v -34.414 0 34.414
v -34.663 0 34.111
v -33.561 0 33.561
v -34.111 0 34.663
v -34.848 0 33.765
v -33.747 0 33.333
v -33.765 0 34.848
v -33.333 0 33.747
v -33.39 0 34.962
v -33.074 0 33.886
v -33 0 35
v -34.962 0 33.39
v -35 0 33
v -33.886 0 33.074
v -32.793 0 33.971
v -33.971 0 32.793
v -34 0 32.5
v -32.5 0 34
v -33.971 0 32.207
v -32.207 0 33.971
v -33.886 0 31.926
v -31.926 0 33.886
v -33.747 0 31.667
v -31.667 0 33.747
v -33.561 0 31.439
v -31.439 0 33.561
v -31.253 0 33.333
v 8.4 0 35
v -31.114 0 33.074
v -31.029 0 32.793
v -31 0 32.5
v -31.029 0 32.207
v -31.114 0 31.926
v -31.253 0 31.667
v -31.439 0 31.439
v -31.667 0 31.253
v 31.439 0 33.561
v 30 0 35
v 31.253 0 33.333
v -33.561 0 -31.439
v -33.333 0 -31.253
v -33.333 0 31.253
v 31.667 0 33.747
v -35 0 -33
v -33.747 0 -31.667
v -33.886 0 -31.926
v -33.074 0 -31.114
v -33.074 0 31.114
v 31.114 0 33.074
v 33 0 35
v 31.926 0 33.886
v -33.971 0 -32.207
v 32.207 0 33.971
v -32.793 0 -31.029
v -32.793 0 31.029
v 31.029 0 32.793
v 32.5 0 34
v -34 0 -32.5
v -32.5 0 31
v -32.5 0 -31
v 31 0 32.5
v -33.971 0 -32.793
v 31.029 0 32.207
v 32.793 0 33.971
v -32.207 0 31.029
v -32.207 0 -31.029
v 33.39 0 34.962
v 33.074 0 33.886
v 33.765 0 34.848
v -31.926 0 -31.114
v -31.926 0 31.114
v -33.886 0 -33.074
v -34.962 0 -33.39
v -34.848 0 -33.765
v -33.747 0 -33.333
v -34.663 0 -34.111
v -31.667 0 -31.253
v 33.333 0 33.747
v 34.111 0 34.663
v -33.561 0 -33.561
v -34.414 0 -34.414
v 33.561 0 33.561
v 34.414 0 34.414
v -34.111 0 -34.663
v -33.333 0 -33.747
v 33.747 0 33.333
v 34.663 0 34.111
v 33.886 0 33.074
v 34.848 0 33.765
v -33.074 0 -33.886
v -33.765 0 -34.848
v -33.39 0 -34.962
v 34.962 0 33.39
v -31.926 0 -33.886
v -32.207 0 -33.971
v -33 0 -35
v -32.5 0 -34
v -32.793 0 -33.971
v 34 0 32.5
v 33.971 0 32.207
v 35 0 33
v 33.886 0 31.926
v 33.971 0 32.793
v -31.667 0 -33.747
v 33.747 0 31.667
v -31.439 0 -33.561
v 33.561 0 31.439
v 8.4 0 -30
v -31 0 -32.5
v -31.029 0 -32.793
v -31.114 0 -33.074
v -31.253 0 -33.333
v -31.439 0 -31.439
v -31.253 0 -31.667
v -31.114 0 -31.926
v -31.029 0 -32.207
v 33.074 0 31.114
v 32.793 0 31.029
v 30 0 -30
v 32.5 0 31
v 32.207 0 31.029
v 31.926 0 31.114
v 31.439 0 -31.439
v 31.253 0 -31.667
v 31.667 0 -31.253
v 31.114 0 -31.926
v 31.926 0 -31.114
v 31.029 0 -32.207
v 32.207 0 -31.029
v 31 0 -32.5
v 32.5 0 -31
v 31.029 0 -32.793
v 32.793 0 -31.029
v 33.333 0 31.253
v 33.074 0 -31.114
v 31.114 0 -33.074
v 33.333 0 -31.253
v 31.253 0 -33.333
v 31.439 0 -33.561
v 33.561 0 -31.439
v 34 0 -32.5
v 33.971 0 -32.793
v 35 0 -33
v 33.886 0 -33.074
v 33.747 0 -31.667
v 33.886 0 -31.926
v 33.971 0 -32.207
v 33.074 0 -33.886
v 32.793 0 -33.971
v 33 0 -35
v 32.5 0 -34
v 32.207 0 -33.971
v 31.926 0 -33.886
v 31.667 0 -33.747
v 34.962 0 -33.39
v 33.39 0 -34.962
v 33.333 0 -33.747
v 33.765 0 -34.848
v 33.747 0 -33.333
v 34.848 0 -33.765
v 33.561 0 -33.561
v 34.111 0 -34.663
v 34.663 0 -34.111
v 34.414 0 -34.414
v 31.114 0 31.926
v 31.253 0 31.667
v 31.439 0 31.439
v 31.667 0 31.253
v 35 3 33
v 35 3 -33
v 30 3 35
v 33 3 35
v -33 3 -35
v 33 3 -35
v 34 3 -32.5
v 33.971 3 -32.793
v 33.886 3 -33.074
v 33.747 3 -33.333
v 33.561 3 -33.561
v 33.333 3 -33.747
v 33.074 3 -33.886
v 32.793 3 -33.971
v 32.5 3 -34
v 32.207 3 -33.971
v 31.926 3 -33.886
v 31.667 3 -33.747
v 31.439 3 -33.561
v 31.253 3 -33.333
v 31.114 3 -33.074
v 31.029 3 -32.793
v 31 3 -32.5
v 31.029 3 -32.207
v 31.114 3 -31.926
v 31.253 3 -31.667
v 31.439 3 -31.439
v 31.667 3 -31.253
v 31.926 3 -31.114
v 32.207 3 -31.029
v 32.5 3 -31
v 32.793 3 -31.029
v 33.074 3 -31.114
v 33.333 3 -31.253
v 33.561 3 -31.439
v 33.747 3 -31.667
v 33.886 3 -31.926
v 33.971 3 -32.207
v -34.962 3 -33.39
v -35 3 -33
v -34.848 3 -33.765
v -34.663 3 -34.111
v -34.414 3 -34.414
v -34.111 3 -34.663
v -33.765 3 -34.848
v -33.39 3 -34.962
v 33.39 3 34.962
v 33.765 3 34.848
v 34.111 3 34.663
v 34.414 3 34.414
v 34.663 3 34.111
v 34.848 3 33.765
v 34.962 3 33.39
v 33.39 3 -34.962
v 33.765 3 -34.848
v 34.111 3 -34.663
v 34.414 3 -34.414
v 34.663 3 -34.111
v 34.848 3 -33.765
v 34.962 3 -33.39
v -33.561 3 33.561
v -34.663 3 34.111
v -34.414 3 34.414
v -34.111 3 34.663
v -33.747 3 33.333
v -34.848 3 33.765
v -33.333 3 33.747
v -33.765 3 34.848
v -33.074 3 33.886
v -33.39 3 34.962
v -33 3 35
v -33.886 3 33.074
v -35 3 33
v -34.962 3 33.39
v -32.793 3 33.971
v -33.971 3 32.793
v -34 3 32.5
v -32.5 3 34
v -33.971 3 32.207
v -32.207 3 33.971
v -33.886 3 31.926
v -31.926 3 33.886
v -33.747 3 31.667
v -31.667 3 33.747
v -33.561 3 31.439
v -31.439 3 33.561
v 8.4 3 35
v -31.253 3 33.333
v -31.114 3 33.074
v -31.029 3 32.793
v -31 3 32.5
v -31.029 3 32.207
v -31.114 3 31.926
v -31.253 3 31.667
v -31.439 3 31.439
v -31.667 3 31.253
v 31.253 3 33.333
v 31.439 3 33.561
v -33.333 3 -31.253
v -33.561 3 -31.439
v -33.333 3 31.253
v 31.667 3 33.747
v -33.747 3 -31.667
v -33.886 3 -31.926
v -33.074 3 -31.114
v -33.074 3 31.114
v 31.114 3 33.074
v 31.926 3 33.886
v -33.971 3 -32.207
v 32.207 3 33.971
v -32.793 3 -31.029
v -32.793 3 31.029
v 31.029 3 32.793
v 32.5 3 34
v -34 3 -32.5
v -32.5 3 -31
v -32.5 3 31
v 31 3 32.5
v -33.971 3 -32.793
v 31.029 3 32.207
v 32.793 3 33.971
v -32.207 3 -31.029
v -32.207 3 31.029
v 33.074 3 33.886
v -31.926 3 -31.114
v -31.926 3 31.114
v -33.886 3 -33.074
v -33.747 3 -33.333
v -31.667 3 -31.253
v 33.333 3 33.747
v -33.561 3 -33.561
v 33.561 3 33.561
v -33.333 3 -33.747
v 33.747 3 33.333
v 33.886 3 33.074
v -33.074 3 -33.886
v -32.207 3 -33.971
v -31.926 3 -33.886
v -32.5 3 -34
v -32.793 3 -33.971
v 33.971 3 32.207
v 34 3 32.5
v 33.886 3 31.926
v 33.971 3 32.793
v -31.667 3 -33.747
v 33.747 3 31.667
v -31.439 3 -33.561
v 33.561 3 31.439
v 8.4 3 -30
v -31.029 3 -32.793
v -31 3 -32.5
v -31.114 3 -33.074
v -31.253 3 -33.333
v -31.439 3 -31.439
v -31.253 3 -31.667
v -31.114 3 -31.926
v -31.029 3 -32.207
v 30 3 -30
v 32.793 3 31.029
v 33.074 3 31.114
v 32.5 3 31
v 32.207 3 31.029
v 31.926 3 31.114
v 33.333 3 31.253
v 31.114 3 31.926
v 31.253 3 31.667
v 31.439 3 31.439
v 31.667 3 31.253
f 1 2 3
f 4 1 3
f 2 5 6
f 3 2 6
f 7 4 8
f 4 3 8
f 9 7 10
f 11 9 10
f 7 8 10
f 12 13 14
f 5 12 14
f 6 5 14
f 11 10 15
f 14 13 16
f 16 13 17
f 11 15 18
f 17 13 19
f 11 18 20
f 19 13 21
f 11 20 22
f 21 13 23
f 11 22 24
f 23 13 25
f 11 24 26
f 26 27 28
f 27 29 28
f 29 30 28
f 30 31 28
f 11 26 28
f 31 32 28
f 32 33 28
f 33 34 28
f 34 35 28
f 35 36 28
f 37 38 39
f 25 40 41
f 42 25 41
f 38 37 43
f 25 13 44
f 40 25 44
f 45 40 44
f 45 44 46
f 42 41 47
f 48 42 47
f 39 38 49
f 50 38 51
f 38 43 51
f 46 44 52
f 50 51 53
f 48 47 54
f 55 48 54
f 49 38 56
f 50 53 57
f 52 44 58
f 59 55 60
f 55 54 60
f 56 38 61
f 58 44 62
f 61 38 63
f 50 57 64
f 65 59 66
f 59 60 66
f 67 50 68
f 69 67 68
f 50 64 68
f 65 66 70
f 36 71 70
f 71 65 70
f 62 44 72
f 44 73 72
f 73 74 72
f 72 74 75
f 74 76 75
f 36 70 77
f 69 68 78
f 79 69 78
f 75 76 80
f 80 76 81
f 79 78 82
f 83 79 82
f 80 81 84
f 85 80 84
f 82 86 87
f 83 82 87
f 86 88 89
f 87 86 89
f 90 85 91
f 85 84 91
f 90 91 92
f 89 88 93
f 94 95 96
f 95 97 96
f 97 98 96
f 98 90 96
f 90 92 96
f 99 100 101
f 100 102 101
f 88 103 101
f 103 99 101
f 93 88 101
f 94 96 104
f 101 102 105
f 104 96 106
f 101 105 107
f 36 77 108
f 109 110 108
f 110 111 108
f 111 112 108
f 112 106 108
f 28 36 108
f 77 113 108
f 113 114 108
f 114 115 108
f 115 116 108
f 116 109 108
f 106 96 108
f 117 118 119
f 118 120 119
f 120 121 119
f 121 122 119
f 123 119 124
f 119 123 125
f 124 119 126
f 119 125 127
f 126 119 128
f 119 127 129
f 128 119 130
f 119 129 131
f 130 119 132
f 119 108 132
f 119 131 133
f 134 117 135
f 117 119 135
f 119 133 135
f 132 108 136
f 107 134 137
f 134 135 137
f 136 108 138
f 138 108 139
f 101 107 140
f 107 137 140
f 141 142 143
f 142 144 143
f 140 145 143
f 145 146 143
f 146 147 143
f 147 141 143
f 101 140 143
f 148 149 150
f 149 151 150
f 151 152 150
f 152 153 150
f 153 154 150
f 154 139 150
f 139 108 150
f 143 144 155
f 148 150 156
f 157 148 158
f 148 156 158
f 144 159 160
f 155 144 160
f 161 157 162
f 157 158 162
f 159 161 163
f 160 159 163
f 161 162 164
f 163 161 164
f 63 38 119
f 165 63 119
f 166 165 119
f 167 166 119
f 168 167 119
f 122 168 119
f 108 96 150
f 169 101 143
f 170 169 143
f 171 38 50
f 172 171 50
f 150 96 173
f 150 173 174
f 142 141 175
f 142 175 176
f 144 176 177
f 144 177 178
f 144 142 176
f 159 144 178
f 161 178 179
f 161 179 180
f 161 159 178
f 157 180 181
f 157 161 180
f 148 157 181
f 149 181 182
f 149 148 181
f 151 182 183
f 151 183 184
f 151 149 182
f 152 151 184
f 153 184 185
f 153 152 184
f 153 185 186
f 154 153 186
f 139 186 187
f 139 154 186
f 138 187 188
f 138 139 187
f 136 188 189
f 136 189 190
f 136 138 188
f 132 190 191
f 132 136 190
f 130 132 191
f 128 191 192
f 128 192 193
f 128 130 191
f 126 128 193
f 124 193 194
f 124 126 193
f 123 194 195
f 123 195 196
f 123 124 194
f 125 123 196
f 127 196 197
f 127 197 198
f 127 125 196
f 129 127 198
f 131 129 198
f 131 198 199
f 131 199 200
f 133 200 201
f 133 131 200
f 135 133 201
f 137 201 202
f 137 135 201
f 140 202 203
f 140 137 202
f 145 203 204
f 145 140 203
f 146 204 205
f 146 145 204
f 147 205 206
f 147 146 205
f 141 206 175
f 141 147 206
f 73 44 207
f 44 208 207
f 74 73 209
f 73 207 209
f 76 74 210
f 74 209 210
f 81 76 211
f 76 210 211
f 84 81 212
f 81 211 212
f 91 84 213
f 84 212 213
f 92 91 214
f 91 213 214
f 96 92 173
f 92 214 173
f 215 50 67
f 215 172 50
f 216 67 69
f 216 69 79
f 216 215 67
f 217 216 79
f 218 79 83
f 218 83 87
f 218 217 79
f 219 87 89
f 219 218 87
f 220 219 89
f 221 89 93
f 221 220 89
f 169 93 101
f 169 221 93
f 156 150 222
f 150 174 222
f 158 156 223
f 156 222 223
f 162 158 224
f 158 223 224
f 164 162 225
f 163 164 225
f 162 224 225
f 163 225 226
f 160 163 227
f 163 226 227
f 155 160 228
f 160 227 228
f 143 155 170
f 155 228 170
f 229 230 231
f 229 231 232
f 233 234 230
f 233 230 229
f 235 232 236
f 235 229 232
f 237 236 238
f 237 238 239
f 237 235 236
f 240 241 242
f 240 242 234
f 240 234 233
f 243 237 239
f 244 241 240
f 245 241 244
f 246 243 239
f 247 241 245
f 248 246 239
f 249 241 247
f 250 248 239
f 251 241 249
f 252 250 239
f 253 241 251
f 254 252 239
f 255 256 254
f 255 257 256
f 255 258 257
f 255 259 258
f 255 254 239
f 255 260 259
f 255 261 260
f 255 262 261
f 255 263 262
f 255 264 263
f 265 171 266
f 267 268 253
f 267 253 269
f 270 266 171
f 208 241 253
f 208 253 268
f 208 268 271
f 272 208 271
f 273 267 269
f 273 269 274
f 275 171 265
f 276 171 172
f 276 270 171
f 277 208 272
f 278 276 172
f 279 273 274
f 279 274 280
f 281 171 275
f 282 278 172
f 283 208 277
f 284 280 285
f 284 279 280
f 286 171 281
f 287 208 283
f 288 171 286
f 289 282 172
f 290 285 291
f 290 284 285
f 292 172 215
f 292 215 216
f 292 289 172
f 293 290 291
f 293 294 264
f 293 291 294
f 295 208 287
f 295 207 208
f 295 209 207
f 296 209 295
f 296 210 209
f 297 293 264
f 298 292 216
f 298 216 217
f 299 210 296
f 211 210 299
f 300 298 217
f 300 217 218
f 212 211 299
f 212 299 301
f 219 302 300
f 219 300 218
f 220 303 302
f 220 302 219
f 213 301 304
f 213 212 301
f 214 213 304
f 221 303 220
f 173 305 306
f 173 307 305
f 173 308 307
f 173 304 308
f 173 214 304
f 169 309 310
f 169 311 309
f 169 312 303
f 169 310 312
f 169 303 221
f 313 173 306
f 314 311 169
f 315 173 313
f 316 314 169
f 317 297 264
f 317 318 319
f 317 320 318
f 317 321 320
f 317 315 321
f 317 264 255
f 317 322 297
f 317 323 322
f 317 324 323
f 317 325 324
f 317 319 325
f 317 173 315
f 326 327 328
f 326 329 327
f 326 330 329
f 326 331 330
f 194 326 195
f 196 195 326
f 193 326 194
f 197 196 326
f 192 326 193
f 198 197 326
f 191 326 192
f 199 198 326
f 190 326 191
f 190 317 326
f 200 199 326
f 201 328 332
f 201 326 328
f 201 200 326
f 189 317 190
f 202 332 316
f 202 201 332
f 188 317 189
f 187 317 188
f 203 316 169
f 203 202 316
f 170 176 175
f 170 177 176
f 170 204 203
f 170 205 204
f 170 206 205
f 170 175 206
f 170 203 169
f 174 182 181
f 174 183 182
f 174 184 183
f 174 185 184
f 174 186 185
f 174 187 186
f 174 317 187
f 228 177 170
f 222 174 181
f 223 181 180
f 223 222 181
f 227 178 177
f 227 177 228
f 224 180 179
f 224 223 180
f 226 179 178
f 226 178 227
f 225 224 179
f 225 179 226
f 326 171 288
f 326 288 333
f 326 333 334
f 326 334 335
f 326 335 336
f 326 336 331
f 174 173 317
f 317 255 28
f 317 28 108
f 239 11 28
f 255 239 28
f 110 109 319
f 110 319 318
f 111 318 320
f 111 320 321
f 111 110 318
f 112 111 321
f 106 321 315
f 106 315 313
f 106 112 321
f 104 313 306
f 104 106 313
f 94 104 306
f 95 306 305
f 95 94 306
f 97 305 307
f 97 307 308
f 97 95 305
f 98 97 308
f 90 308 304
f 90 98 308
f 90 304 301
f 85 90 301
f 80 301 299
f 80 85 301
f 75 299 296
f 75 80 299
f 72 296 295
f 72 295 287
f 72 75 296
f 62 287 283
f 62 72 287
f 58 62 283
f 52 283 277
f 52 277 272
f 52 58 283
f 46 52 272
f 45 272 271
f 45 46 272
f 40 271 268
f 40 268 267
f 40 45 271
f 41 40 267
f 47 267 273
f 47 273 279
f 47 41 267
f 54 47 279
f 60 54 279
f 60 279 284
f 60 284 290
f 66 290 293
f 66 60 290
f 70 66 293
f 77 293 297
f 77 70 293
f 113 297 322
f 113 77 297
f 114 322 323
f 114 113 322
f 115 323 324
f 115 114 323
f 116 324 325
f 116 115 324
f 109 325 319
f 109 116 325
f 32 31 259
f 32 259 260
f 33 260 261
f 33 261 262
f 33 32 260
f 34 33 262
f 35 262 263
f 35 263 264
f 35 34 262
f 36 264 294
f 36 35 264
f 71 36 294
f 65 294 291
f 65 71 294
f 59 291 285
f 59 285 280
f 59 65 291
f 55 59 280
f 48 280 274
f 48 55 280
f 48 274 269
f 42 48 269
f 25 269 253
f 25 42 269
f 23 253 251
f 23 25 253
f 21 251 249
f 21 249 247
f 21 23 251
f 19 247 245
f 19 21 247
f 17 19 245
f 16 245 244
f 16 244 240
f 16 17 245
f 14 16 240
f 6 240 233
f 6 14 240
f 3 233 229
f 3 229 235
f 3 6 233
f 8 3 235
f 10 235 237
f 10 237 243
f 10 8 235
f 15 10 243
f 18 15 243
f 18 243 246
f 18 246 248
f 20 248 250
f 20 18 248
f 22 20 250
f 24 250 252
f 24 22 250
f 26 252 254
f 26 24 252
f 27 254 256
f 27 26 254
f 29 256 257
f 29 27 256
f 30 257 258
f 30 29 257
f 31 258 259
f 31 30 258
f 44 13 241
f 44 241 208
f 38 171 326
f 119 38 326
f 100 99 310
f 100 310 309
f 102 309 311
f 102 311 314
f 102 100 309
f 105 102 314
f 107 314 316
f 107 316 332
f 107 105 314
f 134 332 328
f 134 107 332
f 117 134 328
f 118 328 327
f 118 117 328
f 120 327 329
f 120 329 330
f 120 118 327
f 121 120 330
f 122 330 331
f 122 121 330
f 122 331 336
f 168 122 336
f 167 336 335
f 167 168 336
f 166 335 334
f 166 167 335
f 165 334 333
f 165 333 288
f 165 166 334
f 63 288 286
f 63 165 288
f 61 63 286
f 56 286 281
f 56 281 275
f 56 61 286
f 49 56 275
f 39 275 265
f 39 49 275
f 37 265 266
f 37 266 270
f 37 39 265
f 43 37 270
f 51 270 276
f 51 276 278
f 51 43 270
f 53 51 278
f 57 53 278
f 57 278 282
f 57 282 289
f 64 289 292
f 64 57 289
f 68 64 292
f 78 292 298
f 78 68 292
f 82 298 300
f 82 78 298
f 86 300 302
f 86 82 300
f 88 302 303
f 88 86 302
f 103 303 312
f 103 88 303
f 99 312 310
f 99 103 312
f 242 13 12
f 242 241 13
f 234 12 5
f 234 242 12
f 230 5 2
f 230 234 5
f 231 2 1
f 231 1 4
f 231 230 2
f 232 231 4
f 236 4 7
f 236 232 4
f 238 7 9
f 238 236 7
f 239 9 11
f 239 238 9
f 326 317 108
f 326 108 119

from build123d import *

# Parameters (mm, degrees)
SKETCH1_W           = 70
SKETCH1_H           = 70
SKETCH1_R           = 1.5
BOSS_EXTRUDE1_DEPTH = 3
FILLET1_R           = 2
SKETCH2_W           = 21.6
SKETCH2_H           = 70
CUT_EXTRUDE2_DEPTH  = 10


with BuildPart() as part:
    # Sketch1 → Boss-Extrude1 (new body)
    with BuildSketch(Plane(origin=(0, 0, 0), x_dir=(1, 0, 0), z_dir=(0, 1, 0))):
        Rectangle(SKETCH1_W, SKETCH1_H)
        with Locations((-32.5, 32.5)):
            Circle(SKETCH1_R, mode=Mode.SUBTRACT)
        with Locations((32.5, 32.5)):
            Circle(SKETCH1_R, mode=Mode.SUBTRACT)
        with Locations((32.5, -32.5)):
            Circle(SKETCH1_R, mode=Mode.SUBTRACT)
        with Locations((-32.5, -32.5)):
            Circle(SKETCH1_R, mode=Mode.SUBTRACT)
    extrude(amount=BOSS_EXTRUDE1_DEPTH)

    # Fillet1
    fillet1_edges = [part.edges().sort_by_distance(p)[0] for p in [
        (35, 1.5, 35),
        (-35, 1.5, 35),
        (-35, 1.5, -35),
        (35, 1.5, -35),
    ]]
    fillet(fillet1_edges, radius=FILLET1_R)

    # Sketch2 → Cut-Extrude2 (cut)
    with BuildSketch(Plane(origin=(0, 3, 0), x_dir=(1, 0, 0), z_dir=(0, 1, 0))):
        with Locations((19.2, -5)):
            Rectangle(SKETCH2_W, SKETCH2_H)
    extrude(amount=-CUT_EXTRUDE2_DEPTH, mode=Mode.SUBTRACT)


solid = part.part
